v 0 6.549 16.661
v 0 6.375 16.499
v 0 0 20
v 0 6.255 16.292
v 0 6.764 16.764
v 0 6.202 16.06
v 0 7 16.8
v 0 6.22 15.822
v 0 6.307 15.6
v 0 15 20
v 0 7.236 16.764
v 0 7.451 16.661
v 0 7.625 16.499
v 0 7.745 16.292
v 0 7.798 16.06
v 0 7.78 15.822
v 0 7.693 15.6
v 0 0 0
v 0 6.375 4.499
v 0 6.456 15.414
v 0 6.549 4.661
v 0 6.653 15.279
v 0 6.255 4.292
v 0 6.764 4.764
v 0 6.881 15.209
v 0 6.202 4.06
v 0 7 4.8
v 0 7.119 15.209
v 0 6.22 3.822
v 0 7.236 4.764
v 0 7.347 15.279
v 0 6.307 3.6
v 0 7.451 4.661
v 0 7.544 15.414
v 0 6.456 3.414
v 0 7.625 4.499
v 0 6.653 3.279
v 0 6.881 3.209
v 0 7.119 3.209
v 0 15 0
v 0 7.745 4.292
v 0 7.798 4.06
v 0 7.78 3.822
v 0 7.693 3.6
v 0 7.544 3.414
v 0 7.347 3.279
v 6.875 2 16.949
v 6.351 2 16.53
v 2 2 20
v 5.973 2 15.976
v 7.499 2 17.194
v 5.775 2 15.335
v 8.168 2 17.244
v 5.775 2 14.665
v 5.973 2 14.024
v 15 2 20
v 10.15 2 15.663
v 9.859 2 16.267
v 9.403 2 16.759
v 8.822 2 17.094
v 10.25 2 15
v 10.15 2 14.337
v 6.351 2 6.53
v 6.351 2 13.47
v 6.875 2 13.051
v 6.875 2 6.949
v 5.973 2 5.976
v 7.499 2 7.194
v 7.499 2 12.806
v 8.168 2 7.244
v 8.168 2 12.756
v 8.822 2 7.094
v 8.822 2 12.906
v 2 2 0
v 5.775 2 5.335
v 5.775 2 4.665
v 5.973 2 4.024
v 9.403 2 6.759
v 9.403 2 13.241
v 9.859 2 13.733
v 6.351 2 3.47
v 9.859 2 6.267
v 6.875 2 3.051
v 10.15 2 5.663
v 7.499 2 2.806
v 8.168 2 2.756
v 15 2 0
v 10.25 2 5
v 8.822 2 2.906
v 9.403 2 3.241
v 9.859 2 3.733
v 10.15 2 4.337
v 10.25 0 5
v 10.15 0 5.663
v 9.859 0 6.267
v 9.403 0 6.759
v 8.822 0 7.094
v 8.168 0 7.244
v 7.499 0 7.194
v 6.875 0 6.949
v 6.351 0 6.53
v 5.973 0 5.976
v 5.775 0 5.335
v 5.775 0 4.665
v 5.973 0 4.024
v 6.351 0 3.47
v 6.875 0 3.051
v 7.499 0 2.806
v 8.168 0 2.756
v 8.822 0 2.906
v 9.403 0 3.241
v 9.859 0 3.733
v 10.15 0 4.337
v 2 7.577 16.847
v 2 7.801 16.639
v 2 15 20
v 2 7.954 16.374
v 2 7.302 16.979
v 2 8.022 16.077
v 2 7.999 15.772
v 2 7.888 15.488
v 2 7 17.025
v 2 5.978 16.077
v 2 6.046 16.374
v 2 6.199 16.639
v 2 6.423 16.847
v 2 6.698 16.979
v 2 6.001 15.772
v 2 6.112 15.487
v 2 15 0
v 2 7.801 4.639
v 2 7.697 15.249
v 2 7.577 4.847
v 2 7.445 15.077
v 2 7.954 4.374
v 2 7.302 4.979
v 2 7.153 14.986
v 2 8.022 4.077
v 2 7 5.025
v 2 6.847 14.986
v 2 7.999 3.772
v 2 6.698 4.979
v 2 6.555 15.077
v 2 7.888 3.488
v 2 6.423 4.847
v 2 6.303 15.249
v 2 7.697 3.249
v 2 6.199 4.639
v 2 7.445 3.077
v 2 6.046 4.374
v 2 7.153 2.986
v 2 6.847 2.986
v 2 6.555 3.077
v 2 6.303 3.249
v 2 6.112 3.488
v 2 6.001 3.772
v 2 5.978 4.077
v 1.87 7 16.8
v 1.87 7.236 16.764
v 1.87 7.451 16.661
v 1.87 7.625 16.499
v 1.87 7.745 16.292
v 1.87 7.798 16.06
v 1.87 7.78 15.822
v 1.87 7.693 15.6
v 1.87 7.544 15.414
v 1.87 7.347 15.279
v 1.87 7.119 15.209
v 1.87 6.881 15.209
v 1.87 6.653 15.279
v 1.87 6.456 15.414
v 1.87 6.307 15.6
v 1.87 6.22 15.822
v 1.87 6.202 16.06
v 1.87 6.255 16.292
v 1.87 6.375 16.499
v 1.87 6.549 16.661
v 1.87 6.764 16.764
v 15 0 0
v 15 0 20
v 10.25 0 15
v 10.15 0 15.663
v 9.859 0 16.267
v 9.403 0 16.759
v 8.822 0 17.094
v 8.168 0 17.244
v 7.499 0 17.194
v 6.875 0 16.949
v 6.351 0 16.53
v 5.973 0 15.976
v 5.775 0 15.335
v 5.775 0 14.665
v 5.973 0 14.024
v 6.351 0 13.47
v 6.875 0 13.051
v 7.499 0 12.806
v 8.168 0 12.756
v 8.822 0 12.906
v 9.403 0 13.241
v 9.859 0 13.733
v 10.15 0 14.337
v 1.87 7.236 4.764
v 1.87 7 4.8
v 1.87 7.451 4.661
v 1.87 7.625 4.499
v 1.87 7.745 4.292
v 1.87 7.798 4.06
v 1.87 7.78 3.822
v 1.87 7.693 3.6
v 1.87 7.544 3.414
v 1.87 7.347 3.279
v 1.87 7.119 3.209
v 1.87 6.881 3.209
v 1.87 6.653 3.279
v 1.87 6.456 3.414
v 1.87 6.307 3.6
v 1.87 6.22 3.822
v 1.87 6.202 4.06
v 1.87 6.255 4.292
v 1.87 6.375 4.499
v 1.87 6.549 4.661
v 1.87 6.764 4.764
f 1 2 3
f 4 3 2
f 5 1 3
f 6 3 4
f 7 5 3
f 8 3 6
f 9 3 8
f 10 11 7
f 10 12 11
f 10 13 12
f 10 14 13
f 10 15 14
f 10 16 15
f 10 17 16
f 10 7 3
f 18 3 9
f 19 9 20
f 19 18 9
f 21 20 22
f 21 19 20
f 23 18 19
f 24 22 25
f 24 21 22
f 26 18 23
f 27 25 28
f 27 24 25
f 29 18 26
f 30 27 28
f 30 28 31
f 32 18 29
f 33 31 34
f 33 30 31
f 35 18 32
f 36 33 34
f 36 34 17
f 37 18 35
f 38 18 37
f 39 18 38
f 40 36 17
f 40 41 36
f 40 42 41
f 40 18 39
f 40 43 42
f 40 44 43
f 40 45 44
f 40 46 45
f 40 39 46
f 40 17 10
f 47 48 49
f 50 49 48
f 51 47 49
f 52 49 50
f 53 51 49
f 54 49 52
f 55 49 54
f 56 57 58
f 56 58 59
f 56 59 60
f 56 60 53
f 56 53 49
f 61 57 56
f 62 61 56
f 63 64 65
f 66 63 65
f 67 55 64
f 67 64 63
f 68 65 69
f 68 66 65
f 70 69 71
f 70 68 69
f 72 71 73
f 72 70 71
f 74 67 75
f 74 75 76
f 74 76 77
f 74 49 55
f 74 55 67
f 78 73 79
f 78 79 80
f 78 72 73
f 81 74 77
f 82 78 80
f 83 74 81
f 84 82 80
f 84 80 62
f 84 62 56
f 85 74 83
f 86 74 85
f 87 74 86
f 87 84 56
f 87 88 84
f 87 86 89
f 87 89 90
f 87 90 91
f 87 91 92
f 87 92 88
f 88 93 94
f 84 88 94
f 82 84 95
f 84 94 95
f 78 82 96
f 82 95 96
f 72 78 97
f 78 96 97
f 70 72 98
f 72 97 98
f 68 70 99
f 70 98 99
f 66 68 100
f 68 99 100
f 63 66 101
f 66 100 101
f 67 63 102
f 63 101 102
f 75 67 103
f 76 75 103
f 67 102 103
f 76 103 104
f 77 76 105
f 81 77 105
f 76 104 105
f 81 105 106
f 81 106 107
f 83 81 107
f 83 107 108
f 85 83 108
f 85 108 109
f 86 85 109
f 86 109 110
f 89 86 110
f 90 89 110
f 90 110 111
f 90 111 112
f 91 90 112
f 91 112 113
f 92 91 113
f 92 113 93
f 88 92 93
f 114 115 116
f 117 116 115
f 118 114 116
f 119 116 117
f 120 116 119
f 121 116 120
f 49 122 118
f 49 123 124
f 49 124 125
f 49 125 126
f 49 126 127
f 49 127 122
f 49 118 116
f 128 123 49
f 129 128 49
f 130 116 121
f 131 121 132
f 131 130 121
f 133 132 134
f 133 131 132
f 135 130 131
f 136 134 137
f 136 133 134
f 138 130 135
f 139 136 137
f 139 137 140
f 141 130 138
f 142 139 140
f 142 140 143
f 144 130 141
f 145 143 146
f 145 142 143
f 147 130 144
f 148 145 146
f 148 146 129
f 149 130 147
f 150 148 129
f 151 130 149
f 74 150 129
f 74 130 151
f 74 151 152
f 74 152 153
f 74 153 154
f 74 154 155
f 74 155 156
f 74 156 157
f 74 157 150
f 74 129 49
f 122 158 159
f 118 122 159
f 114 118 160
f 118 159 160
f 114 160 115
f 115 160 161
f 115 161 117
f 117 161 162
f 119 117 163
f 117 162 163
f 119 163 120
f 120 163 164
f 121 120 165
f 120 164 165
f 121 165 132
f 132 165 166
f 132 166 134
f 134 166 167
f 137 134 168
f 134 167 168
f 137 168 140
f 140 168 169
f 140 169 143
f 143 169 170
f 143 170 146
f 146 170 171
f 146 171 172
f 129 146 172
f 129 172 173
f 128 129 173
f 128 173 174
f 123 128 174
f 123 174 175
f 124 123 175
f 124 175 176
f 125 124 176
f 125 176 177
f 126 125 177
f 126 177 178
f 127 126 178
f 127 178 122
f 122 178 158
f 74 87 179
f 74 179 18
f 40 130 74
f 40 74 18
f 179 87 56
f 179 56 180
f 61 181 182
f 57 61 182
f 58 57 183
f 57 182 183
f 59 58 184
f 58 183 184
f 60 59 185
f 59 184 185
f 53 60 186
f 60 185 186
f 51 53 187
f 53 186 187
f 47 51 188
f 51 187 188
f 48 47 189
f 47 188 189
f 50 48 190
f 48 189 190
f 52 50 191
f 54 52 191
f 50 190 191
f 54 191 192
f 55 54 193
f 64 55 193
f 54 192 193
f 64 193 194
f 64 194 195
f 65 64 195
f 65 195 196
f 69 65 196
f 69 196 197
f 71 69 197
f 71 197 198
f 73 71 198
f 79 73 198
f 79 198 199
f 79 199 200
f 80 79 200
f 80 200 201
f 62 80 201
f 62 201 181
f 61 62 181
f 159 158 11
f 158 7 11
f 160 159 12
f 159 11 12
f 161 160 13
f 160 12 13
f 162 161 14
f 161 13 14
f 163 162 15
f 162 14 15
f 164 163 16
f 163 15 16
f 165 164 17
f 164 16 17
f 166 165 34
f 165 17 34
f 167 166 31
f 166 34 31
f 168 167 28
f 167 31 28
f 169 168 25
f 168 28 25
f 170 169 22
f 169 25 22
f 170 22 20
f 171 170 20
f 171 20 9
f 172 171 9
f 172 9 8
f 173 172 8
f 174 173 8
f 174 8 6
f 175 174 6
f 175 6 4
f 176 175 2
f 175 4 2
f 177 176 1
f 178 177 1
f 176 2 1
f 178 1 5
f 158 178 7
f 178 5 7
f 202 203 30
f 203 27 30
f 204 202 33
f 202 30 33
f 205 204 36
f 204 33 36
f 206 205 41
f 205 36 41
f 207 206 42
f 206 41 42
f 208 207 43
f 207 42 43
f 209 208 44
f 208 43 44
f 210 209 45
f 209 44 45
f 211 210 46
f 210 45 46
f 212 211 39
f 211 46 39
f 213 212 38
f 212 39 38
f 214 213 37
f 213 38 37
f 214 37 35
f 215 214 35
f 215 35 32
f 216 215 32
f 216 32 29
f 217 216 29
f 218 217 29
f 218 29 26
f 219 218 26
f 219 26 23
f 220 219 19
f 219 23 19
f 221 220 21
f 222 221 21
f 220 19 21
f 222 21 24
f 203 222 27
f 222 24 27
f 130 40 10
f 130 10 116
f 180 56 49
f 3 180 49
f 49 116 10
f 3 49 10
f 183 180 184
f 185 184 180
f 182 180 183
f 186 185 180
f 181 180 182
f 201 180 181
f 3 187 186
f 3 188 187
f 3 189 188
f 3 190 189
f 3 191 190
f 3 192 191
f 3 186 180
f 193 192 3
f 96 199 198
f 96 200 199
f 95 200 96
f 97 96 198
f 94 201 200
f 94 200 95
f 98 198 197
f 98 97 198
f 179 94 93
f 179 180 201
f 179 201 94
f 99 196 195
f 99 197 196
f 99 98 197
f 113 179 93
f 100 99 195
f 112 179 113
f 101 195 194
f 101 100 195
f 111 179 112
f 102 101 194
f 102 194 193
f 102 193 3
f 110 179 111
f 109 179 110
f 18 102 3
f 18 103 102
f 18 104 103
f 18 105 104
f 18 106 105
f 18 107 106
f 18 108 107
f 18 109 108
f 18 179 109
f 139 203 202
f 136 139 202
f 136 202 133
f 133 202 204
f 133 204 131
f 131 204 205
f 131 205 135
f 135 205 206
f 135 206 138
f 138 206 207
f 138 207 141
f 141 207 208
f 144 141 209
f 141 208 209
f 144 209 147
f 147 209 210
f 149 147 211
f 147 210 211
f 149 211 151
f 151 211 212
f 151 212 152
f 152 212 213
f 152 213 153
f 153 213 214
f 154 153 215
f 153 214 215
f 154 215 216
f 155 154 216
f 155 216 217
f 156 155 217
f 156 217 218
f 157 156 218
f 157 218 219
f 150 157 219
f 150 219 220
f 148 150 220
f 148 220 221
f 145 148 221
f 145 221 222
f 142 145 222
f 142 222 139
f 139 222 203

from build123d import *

# Parameters (mm, degrees)
EXTRUDE_1_DEPTH             = 20
HOLE_WIZARD_M41_D           = 4.5
HOLE_WIZARD_M41_DEPTH       = 5
HOLE_WIZARD_M41_TIP         = 1.351936393
HOLE_WIZARD_M21_D           = 1.6
HOLE_WIZARD_M21_DEPTH       = 6
HOLE_WIZARD_M21_CSINK_D     = 2.05
HOLE_WIZARD_M21_CSINK_ANGLE = 120
HOLE_WIZARD_M21_TIP         = 0.480688495


with BuildPart() as part:
    # Эскиз1 → Бобышка-Вытянуть1 (new body)
    with BuildSketch(Plane.XY):
        Polygon((0, 0), (0, 15), (2, 15), (2, 2), (15, 2), (15, 0), align=None)
    extrude(amount=EXTRUDE_1_DEPTH)

    # Отверстие с зазором M41
    with Locations(Plane(origin=(0, 2, 0), x_dir=(-1, 0, 0), z_dir=(0, 1, 0))):
        with Locations((-8, 5), (-8, 15)):
            Hole(HOLE_WIZARD_M41_D / 2, depth=HOLE_WIZARD_M41_DEPTH)
            with Locations((0, 0, -(HOLE_WIZARD_M41_DEPTH + HOLE_WIZARD_M41_TIP / 2))):  # 118° drill point
                Cone(0, HOLE_WIZARD_M41_D / 2, HOLE_WIZARD_M41_TIP, mode=Mode.SUBTRACT)

    # Отверстие обработанное метчиком M21
    with Locations(Plane(origin=(2, 0, 0), x_dir=(0, 0, -1), z_dir=(1, 0, 0))):
        with Locations((-4, 7), (-16, 7)):
            CounterSinkHole(HOLE_WIZARD_M21_D / 2, HOLE_WIZARD_M21_CSINK_D / 2, depth=HOLE_WIZARD_M21_DEPTH, counter_sink_angle=HOLE_WIZARD_M21_CSINK_ANGLE)
            with Locations((0, 0, -(HOLE_WIZARD_M21_DEPTH + HOLE_WIZARD_M21_TIP / 2))):  # 118° drill point
                Cone(0, HOLE_WIZARD_M21_D / 2, HOLE_WIZARD_M21_TIP, mode=Mode.SUBTRACT)


solid = part.part
